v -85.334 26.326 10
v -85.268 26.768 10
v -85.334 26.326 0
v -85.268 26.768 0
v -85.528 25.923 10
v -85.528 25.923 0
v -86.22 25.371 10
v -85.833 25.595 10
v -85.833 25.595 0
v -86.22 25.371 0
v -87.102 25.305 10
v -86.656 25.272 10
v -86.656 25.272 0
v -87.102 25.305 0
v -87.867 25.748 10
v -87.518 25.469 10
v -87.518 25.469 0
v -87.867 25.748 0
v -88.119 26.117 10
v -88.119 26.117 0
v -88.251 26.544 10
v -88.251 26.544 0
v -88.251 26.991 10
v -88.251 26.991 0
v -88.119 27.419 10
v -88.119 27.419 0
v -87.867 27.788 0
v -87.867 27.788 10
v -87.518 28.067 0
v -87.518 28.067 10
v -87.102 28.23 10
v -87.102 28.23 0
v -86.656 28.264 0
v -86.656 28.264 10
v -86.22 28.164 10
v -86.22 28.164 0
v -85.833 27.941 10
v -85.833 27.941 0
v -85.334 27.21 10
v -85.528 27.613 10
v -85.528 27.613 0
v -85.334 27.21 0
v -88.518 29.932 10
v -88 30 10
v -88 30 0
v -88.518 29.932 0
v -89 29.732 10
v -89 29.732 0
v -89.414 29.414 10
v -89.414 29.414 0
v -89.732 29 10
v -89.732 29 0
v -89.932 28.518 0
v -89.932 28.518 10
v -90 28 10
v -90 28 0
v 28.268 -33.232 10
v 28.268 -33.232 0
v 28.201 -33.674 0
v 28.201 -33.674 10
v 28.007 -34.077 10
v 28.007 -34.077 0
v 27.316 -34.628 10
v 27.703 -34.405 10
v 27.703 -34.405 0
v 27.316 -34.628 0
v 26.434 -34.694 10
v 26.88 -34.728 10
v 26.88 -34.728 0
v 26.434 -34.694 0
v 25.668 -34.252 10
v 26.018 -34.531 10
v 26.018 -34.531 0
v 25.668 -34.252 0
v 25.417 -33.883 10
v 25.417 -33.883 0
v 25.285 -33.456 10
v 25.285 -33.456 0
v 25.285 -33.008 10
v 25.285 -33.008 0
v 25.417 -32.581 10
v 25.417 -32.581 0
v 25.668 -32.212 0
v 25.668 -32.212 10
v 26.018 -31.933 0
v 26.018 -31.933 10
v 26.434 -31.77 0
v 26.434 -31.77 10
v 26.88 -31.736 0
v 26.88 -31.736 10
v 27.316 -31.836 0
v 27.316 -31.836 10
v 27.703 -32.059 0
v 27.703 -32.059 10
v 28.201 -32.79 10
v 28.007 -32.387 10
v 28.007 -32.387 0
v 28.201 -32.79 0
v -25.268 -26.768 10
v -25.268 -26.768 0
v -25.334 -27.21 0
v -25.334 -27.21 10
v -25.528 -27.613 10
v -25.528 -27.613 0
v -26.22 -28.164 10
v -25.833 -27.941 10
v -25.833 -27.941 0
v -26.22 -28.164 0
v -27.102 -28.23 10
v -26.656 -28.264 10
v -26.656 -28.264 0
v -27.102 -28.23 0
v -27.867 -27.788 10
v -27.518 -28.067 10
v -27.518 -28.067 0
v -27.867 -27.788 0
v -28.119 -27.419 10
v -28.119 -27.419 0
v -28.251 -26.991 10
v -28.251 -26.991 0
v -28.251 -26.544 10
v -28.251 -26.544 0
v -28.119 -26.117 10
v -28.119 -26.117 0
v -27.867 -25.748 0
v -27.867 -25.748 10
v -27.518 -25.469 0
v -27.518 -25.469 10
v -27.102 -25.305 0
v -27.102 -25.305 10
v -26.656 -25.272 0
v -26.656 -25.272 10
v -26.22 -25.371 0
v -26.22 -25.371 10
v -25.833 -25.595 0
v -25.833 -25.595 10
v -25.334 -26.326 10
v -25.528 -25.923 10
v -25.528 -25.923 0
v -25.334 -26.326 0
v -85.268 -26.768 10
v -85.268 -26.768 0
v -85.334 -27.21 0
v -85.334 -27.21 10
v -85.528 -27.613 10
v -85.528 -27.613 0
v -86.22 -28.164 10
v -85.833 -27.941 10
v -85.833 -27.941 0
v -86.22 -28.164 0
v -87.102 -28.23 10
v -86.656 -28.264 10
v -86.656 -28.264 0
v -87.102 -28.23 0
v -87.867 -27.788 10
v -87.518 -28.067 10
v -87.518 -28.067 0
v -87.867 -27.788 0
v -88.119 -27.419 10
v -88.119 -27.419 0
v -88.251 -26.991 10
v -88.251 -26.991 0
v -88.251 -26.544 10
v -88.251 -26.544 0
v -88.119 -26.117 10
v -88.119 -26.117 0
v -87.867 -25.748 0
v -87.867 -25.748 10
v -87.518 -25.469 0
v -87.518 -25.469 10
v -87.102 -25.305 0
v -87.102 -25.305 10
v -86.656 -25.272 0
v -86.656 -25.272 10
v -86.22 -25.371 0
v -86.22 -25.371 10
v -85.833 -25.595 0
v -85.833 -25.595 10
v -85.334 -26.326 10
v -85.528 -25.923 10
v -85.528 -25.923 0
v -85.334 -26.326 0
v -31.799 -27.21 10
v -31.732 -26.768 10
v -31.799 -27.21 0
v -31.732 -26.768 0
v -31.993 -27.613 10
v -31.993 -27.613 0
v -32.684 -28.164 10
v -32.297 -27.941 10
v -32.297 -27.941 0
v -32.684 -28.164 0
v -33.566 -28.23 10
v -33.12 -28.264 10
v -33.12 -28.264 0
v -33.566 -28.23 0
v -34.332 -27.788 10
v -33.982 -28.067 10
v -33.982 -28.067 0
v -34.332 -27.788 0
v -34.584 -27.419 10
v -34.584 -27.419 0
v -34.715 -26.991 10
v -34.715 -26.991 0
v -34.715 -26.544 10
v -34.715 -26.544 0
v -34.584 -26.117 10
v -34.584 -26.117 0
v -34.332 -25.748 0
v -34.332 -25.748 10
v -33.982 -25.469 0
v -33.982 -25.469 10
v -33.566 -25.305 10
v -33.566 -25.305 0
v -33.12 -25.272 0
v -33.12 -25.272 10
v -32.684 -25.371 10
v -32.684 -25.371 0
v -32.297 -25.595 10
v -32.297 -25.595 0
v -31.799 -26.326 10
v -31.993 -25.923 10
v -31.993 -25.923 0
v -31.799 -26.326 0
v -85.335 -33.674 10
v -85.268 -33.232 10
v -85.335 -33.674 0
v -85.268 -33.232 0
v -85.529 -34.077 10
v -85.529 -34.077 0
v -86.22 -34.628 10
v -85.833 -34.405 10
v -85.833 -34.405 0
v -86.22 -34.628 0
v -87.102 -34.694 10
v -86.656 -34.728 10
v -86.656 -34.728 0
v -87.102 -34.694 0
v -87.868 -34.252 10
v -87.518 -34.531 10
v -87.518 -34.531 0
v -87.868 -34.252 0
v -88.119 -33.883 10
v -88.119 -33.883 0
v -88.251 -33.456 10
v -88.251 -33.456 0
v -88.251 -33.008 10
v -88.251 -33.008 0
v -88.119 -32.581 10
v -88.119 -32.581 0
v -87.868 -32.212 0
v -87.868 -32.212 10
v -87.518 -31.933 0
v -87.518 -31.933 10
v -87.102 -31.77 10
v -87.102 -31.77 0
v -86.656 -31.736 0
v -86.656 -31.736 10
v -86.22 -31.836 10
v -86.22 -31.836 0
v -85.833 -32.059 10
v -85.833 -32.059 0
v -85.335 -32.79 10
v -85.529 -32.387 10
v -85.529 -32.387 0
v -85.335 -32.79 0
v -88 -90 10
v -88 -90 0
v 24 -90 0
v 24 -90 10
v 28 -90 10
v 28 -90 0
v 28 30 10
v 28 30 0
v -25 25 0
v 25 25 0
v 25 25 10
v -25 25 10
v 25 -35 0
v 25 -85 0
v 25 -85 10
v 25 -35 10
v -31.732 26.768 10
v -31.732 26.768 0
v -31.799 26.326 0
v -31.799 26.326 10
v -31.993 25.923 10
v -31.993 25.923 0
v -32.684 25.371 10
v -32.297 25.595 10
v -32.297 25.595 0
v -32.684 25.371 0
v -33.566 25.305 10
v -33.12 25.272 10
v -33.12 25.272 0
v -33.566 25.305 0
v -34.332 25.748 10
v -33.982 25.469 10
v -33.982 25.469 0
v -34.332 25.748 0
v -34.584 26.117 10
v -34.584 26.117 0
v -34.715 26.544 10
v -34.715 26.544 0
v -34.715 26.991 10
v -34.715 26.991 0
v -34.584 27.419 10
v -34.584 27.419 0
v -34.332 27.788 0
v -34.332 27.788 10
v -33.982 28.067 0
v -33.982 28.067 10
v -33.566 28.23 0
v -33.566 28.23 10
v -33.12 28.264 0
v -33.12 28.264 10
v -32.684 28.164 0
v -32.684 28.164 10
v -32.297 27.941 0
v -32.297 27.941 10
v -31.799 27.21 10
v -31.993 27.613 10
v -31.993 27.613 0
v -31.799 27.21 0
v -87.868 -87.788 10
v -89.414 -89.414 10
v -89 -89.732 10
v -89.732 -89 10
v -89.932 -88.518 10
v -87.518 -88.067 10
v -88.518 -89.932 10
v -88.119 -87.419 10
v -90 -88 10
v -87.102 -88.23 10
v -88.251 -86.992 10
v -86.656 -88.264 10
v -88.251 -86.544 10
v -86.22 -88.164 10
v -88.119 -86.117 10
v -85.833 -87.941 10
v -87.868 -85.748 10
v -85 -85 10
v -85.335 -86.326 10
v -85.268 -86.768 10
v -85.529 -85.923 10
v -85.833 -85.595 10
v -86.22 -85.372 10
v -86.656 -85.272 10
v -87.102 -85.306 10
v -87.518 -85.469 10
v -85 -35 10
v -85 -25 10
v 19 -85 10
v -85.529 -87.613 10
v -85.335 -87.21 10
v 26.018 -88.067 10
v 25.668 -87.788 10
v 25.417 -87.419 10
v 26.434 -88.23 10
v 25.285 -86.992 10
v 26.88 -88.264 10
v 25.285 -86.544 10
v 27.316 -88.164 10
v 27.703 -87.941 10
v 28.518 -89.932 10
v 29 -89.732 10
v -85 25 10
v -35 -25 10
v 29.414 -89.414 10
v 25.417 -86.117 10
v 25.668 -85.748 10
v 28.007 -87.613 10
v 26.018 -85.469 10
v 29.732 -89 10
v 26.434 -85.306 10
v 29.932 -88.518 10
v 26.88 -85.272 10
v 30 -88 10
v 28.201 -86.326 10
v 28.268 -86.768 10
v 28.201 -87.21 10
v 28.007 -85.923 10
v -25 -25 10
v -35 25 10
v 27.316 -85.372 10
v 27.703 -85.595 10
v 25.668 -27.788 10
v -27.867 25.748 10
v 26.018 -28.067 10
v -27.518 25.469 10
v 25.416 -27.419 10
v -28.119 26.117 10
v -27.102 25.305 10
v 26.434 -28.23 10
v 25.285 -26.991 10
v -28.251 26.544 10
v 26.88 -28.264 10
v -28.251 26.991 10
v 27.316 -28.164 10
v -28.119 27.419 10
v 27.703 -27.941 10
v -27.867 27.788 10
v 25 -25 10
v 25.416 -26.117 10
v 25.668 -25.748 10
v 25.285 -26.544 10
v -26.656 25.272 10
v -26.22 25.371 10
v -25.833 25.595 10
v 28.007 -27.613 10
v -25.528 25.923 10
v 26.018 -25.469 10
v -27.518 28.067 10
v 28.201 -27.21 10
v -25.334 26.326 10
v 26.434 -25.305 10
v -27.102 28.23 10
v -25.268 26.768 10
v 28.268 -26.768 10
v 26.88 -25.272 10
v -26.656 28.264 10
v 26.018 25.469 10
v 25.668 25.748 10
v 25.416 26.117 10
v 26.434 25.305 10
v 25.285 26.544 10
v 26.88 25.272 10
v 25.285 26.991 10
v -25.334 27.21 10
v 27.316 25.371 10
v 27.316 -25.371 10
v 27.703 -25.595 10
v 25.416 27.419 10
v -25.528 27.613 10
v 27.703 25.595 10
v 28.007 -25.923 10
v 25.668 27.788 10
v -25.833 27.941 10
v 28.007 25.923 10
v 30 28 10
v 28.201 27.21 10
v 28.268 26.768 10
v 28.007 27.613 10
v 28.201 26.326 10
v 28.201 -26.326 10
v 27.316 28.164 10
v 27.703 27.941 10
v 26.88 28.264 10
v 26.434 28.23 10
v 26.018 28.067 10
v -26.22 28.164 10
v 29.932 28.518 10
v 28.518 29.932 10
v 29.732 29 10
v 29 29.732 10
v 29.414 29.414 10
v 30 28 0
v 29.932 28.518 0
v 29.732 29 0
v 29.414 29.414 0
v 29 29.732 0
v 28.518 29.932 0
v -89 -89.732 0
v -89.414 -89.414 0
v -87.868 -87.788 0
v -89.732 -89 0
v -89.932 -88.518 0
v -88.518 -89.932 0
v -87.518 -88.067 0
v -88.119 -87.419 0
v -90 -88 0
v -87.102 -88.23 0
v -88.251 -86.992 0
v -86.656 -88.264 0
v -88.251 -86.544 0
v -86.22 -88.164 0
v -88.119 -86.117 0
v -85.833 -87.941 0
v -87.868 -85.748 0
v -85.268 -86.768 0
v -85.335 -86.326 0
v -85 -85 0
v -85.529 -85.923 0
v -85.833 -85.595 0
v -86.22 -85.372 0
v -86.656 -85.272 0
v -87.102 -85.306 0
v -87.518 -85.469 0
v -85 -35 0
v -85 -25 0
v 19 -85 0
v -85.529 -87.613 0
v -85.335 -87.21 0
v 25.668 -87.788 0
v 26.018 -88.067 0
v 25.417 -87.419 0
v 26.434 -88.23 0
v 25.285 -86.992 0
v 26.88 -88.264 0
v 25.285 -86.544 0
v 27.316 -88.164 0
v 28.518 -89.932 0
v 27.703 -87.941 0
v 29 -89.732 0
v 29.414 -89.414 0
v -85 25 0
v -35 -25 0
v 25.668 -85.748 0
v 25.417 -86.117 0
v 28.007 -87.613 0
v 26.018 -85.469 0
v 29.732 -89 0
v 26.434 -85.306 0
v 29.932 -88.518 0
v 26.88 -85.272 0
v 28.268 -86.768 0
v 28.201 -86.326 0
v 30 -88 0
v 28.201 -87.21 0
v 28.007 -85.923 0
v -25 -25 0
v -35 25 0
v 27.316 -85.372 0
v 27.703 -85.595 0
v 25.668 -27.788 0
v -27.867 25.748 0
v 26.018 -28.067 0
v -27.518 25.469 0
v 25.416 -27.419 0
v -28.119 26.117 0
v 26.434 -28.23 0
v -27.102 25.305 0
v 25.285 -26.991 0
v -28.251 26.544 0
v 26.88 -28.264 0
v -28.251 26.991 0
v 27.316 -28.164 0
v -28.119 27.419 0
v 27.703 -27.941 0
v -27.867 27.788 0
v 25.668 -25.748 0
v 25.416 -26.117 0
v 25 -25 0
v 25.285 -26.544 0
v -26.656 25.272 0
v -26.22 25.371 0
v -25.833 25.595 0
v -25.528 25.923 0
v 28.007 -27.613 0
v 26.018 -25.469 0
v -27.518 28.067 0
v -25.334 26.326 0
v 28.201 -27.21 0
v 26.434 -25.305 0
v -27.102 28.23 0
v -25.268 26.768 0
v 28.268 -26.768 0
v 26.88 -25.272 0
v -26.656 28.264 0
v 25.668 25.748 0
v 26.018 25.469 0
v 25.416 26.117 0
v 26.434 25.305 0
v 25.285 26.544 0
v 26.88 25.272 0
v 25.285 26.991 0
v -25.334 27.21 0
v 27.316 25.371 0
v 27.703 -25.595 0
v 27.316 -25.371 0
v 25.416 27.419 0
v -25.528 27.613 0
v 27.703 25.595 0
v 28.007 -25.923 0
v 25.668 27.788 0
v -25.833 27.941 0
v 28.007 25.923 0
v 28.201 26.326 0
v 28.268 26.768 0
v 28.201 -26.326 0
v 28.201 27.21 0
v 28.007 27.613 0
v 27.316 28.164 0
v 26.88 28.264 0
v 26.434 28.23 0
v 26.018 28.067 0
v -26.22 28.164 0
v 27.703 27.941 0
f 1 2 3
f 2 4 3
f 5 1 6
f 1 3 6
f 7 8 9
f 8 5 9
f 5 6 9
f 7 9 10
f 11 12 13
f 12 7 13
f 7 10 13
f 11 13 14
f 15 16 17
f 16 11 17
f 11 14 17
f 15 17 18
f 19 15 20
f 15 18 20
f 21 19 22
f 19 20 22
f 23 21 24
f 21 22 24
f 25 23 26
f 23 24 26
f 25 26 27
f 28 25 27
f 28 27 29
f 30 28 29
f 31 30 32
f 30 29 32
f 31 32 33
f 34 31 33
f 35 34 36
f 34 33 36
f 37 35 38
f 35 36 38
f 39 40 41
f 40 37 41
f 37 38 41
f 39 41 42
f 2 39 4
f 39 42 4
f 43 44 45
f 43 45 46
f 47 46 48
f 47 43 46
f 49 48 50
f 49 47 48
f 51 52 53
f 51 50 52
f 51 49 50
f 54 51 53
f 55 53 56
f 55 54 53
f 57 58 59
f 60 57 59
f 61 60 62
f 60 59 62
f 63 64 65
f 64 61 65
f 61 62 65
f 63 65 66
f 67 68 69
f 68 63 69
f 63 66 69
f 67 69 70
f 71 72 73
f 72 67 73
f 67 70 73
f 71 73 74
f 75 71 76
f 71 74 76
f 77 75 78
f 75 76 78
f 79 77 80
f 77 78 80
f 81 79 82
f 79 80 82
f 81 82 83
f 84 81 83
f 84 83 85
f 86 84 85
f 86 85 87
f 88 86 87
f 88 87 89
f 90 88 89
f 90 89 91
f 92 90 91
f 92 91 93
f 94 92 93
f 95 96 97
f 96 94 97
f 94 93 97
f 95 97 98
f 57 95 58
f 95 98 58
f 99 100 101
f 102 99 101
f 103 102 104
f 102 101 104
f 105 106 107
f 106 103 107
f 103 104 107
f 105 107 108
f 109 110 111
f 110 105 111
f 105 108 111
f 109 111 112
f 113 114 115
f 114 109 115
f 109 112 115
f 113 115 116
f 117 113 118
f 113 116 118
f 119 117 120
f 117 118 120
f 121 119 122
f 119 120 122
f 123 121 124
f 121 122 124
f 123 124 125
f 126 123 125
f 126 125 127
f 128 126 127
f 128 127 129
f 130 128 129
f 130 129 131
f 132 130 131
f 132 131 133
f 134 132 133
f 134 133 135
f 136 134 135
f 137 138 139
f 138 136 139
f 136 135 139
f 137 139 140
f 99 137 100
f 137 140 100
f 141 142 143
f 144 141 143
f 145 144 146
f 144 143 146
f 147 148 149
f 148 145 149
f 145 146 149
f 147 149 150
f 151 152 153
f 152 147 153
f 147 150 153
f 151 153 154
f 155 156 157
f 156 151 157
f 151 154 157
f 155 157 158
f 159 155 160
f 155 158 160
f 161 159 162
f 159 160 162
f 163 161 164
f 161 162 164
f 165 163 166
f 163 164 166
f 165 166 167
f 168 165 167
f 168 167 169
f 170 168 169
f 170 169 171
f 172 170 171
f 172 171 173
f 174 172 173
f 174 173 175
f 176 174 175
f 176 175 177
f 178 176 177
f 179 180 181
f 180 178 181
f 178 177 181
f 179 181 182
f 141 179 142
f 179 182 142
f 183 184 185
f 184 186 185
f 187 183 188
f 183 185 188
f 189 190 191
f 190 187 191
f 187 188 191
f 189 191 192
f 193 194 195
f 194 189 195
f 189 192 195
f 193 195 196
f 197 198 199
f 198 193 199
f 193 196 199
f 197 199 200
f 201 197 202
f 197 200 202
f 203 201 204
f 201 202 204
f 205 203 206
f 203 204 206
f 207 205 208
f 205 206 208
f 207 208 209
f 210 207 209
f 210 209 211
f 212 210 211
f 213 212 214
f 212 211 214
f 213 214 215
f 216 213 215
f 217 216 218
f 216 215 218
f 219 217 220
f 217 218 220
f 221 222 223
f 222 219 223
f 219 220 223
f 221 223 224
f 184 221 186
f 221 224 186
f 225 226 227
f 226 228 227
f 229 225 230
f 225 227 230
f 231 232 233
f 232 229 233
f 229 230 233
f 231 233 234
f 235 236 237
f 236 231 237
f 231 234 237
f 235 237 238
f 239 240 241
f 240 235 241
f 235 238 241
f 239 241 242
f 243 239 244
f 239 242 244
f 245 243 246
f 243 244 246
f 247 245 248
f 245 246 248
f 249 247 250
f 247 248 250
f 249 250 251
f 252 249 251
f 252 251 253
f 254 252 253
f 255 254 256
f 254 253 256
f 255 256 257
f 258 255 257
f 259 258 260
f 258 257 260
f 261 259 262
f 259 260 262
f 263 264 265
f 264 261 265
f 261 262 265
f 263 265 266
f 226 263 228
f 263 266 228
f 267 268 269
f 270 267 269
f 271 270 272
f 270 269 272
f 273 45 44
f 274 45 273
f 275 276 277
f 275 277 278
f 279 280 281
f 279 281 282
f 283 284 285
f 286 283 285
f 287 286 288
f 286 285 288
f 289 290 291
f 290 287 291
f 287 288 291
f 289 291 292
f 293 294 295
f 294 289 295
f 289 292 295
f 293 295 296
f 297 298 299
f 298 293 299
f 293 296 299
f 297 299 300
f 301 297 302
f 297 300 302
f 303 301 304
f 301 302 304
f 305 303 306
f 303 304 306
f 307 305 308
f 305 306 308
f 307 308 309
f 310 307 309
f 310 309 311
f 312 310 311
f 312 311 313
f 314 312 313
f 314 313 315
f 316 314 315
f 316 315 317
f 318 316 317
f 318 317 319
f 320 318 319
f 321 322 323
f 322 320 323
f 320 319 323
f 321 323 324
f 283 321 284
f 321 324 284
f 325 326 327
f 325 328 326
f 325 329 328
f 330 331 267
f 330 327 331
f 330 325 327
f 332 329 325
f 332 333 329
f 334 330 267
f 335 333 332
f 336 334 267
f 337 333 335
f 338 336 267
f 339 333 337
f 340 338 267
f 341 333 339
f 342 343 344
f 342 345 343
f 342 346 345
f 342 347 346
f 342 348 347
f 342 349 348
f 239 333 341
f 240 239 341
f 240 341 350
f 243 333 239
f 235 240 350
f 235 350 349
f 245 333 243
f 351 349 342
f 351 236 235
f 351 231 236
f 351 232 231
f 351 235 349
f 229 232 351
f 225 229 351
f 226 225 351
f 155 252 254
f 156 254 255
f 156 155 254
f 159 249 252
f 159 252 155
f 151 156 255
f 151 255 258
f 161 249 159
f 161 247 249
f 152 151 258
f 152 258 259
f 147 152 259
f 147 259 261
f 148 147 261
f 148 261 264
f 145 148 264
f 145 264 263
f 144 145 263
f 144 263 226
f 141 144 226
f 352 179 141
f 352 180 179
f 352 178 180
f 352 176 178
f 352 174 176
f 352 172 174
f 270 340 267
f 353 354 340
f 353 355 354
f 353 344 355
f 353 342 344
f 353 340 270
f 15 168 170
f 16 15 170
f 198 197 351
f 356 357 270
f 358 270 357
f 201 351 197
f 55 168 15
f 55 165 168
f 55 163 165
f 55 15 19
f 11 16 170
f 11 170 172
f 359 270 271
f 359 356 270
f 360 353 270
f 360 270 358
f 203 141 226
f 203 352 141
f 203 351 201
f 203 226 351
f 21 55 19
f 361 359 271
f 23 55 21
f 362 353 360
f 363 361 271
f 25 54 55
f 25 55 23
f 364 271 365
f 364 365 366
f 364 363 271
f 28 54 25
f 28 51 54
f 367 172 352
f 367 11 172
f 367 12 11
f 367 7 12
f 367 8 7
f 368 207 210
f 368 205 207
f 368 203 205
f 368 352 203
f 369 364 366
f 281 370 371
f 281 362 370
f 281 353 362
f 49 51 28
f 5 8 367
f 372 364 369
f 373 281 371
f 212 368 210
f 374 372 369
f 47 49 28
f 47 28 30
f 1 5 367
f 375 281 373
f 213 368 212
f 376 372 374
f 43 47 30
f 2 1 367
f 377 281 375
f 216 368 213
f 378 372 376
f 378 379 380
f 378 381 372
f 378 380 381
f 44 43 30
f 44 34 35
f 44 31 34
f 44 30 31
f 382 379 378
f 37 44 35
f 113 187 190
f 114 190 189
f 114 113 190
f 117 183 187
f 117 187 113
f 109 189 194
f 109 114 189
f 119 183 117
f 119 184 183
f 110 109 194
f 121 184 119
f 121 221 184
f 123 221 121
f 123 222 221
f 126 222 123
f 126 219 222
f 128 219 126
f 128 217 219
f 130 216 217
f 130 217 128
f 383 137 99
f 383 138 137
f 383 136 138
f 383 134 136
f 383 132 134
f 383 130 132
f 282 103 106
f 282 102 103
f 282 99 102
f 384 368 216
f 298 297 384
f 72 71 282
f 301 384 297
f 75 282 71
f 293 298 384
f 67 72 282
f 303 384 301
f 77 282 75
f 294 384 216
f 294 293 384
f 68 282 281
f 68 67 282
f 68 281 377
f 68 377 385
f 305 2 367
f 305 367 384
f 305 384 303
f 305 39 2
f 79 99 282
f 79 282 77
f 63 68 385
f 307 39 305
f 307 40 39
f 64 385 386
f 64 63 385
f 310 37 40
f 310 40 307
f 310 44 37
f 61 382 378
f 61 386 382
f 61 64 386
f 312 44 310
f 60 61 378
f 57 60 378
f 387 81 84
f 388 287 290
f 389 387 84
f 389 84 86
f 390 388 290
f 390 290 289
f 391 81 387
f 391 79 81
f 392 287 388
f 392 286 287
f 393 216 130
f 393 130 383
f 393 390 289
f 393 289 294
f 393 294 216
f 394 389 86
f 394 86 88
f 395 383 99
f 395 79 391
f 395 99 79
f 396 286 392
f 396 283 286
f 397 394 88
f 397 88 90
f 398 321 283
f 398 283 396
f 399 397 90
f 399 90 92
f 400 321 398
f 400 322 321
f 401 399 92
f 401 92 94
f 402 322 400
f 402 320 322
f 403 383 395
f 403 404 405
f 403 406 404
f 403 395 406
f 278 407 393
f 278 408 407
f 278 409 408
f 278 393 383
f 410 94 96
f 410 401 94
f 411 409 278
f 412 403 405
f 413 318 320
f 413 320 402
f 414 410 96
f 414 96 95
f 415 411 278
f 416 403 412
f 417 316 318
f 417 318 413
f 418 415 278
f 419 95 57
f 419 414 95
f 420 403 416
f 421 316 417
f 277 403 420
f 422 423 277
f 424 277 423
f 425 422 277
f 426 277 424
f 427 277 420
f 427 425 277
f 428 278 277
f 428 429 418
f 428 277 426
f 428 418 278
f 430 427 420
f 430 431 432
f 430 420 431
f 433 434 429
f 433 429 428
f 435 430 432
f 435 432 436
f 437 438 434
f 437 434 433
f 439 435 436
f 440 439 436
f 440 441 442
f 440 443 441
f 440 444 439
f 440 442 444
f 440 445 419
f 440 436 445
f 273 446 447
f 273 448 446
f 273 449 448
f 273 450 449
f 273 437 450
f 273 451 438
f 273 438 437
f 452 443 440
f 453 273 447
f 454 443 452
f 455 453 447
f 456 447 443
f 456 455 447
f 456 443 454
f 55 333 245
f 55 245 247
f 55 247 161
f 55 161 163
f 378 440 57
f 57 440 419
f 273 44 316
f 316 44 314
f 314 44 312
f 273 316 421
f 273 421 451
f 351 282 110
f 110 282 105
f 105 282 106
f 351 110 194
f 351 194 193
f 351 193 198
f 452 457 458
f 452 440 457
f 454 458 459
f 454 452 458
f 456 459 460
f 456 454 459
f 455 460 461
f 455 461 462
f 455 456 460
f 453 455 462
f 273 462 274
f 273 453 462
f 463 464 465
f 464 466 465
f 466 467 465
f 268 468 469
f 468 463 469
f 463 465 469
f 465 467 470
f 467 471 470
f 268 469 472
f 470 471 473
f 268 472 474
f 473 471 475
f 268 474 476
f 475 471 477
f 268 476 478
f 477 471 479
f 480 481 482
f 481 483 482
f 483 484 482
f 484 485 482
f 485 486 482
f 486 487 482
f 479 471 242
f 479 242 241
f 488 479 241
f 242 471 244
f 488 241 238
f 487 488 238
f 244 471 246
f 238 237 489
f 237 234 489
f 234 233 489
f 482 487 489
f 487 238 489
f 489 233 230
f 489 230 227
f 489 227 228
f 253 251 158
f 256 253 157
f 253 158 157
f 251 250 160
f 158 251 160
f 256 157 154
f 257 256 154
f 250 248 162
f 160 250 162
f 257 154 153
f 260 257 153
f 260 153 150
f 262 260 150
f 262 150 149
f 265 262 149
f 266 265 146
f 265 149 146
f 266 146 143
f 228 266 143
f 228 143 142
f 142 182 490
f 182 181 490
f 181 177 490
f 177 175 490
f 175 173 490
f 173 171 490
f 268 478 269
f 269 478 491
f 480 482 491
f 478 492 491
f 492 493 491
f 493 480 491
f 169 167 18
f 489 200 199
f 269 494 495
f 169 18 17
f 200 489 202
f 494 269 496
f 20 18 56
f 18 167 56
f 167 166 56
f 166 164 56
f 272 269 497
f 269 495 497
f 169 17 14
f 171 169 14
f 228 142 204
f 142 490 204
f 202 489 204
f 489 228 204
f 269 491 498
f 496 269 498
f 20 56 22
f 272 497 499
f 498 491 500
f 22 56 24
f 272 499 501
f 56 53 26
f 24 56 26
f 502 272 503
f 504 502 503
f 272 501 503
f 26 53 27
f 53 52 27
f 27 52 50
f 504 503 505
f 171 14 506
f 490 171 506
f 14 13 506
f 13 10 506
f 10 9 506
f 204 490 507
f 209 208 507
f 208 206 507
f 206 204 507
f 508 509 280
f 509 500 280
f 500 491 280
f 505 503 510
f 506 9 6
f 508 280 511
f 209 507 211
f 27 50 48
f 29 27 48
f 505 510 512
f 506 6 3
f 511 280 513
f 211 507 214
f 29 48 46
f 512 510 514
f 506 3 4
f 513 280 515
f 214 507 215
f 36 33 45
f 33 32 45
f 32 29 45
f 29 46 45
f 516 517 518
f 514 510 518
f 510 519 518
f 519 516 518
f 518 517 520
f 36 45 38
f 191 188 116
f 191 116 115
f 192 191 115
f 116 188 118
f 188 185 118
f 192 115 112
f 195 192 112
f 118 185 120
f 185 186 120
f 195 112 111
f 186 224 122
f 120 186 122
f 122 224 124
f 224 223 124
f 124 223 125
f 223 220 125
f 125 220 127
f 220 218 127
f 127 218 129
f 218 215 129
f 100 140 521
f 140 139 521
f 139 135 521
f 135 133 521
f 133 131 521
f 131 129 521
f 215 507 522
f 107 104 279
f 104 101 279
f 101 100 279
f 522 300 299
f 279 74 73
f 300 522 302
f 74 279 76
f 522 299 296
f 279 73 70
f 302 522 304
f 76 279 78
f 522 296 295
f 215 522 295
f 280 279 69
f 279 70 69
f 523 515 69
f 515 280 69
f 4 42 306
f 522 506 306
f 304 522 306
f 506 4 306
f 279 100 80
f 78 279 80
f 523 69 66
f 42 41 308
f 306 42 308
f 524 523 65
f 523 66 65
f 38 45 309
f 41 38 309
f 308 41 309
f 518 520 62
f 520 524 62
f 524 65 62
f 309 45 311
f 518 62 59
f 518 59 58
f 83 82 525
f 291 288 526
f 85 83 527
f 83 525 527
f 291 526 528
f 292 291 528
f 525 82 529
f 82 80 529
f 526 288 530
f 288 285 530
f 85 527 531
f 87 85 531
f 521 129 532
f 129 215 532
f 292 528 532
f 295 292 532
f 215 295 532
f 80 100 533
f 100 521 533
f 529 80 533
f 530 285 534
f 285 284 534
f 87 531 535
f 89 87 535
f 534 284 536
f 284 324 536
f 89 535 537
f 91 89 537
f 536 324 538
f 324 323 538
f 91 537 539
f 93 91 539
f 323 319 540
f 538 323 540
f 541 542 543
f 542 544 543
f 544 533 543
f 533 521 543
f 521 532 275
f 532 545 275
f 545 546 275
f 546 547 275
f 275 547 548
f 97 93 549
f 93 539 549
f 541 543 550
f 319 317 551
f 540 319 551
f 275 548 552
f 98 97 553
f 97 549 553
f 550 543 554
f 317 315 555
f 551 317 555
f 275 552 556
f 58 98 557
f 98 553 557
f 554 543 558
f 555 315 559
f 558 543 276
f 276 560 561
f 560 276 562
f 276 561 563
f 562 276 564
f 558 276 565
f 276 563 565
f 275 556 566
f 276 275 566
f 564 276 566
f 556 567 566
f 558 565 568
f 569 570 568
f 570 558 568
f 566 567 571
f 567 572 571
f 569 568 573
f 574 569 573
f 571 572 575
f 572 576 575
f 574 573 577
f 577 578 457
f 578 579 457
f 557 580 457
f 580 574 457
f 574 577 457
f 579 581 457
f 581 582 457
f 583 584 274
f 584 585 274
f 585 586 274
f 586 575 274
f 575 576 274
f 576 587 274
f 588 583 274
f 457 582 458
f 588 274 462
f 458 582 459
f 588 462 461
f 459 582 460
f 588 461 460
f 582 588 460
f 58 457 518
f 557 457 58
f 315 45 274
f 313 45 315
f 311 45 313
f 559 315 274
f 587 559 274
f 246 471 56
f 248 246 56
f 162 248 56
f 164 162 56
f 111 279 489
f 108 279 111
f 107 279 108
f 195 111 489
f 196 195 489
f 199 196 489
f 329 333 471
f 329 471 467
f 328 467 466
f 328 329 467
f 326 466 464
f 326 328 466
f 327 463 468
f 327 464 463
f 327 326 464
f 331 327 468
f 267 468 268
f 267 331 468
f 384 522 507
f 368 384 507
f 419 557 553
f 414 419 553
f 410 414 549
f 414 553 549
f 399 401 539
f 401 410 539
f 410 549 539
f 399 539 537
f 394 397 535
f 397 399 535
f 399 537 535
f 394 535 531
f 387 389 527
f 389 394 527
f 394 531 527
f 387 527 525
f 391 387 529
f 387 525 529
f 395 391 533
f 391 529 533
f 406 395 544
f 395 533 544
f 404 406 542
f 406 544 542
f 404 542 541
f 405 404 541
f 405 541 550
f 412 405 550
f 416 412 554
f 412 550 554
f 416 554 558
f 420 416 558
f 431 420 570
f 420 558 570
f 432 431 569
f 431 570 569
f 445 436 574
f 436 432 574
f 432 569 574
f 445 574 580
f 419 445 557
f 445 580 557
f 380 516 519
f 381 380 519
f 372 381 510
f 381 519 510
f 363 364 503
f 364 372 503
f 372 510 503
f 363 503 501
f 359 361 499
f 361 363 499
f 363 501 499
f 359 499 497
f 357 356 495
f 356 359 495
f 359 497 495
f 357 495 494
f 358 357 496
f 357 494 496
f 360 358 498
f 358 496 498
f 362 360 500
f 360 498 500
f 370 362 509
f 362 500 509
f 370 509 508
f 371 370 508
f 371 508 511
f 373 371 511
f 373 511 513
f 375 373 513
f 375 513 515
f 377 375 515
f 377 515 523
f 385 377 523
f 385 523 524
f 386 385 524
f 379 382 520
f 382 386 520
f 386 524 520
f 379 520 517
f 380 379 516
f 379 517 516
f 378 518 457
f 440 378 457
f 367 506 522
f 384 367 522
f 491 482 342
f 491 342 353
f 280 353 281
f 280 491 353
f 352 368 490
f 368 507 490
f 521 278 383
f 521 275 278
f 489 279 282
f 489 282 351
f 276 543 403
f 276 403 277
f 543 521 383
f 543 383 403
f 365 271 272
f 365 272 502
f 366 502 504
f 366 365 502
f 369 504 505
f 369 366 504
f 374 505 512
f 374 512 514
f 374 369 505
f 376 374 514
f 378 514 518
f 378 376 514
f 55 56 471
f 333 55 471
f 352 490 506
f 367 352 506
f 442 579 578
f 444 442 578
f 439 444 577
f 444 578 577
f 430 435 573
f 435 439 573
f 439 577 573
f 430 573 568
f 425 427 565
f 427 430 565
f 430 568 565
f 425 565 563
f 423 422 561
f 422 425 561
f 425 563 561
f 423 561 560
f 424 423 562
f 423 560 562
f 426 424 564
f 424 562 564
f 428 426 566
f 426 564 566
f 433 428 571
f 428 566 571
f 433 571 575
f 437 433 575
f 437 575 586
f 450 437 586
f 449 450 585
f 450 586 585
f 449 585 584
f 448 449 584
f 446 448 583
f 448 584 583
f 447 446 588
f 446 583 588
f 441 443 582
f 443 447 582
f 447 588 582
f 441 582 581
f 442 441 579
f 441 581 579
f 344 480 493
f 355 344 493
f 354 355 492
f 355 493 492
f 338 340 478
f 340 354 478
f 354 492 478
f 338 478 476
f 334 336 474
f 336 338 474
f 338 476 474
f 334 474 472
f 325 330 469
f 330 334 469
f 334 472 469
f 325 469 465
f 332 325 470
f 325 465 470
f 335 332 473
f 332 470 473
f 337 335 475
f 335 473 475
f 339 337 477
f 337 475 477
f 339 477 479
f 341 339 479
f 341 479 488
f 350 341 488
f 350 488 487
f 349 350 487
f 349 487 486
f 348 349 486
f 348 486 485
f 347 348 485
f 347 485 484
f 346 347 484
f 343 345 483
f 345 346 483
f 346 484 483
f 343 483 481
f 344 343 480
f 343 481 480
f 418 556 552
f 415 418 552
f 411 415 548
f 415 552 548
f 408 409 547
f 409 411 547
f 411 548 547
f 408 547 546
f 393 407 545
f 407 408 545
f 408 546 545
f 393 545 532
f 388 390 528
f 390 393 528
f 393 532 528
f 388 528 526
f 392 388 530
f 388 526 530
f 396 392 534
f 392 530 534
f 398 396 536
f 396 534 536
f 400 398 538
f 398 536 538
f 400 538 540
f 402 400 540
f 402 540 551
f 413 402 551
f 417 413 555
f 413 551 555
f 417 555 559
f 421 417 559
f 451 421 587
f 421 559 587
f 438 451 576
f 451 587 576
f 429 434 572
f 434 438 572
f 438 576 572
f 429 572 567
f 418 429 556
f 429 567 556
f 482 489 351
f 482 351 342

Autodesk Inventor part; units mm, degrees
ref_plane "YZ Plane" through (0, 0, 0) normal (1, 0, 0) x (0, 1, 0)
ref_plane "XZ Plane" through (0, 0, 0) normal (0, 1, 0) x (-1, 0, 0)
ref_plane "XY Plane" through (0, 0, 0) normal (0, 0, 1) x (1, 0, 0)
sketch "Sketch1" plane through (0, 0, 0) normal (0, 0, 1) x (1, 0, 0)
  line L0 (-79, -35) -> (19, -35) projected
  line L1 (25, -41) -> (25, -79) projected
  line L2 (30, -32) -> (30, -36) projected
  line L3 (30, -24) -> (30, -28) projected
  line L4 (28, -30) -> (24, -30) projected
  line L5 (-24, -30) -> (-28, -30) projected
  line L6 (-30, -28) -> (-30, -24) projected
  line L7 (-88, -30) -> (-84, -30) projected
  line L8 (-85, -79) -> (-85, -41) projected
  line L9 (19, -85) -> (-79, -85) projected
  line L10 (30, -84) -> (30, -88) projected
  line L11 (24, -90) -> (19, -85) projected
  line L12 (28, -90) -> (24, -90) projected
  line L13 (-84, -90) -> (-88, -90) projected
  line L14 (-90, -88) -> (-90, -84) projected
  line L15 (-30, 24) -> (-30, 28) projected
  line L16 (-28, 30) -> (-24, 30) projected
  line L17 (24, 30) -> (28, 30) projected
  line L18 (30, 28) -> (30, 24) projected
  line L19 (25, 19) -> (25, -19) projected
  line L20 (-25, -19) -> (-25, 19) projected
  line L21 (19, -25) -> (-19, -25) projected
  line L22 (-19, 25) -> (19, 25) projected
  line L23 (25, 25) -> (-25, 25)
  line L24 (-25, 25) -> (-25, -25)
  line L25 (-25, -25) -> (25, -25)
  line L26 (25, -25) -> (25, 25)
  line L27 (25, -35) -> (-85, -35)
  line L28 (-85, -35) -> (-85, -85)
  line L29 (-85, -85) -> (25, -85)
  line L30 (25, -85) -> (25, -35)
  line L31 (30, -30) -> (-90, -30)
  line L32 (-90, -30) -> (-90, -90)
  line L33 (-90, -90) -> (30, -90)
  line L34 (30, -90) -> (30, -30)
  line L35 (30, 30) -> (-30, 30)
  line L36 (-30, 30) -> (-30, -30)
  line L37 (-30, -30) -> (30, -30)
  line L38 (30, -30) -> (30, 30)
  line L39 (-30, -30) -> (-90, -30)
  line L40 (-90, -30) -> (-90, 30)
  line L41 (-90, 30) -> (-30, 30)
  line L42 (-30, 30) -> (-30, -30)
  line L43 (-30, -25) -> (-35, -25)
  line L44 (-35, -25) -> (-85, -25)
  line L45 (-85, -25) -> (-85, 25)
  line L46 (-85, 25) -> (-35, 25)
  line L47 (-35, 25) -> (-35, -25)
  circle A0 centre (-26.7678, 26.7678) radius 1.5 projected
  circle A1 centre (26.7678, 26.7678) radius 1.5 projected
  circle A2 centre (26.7678, -26.7678) radius 1.5 projected
  circle A3 centre (-26.7678, -26.7678) radius 1.5 projected
  circle A4 centre (26.768, -33.232) radius 1.5 projected
  circle A5 centre (26.768, -86.768) radius 1.5 projected
  circle A6 centre (-86.768, -86.768) radius 1.5 projected
  circle A7 centre (-86.768, -33.232) radius 1.5 projected
  circle A8 centre (-33.2322, 26.7678) radius 1.5
  circle A9 centre (-86.7678, 26.7678) radius 1.5
  circle A10 centre (-86.7678, -26.7678) radius 1.5
  circle A11 centre (-33.2322, -26.7678) radius 1.5
  point P0 (0, 0)
  dimension "d0" = 5
extrude "Extrusion1" add sketch "Sketch1" along normal blind 10
fillet "Fillet1" radius 2 4 edges at (-90, 30, 5) (-90, -90, 5) (30, -90, 5) (30, 30, 5)
properties part number "frame_demo_2x2_xyxx"
